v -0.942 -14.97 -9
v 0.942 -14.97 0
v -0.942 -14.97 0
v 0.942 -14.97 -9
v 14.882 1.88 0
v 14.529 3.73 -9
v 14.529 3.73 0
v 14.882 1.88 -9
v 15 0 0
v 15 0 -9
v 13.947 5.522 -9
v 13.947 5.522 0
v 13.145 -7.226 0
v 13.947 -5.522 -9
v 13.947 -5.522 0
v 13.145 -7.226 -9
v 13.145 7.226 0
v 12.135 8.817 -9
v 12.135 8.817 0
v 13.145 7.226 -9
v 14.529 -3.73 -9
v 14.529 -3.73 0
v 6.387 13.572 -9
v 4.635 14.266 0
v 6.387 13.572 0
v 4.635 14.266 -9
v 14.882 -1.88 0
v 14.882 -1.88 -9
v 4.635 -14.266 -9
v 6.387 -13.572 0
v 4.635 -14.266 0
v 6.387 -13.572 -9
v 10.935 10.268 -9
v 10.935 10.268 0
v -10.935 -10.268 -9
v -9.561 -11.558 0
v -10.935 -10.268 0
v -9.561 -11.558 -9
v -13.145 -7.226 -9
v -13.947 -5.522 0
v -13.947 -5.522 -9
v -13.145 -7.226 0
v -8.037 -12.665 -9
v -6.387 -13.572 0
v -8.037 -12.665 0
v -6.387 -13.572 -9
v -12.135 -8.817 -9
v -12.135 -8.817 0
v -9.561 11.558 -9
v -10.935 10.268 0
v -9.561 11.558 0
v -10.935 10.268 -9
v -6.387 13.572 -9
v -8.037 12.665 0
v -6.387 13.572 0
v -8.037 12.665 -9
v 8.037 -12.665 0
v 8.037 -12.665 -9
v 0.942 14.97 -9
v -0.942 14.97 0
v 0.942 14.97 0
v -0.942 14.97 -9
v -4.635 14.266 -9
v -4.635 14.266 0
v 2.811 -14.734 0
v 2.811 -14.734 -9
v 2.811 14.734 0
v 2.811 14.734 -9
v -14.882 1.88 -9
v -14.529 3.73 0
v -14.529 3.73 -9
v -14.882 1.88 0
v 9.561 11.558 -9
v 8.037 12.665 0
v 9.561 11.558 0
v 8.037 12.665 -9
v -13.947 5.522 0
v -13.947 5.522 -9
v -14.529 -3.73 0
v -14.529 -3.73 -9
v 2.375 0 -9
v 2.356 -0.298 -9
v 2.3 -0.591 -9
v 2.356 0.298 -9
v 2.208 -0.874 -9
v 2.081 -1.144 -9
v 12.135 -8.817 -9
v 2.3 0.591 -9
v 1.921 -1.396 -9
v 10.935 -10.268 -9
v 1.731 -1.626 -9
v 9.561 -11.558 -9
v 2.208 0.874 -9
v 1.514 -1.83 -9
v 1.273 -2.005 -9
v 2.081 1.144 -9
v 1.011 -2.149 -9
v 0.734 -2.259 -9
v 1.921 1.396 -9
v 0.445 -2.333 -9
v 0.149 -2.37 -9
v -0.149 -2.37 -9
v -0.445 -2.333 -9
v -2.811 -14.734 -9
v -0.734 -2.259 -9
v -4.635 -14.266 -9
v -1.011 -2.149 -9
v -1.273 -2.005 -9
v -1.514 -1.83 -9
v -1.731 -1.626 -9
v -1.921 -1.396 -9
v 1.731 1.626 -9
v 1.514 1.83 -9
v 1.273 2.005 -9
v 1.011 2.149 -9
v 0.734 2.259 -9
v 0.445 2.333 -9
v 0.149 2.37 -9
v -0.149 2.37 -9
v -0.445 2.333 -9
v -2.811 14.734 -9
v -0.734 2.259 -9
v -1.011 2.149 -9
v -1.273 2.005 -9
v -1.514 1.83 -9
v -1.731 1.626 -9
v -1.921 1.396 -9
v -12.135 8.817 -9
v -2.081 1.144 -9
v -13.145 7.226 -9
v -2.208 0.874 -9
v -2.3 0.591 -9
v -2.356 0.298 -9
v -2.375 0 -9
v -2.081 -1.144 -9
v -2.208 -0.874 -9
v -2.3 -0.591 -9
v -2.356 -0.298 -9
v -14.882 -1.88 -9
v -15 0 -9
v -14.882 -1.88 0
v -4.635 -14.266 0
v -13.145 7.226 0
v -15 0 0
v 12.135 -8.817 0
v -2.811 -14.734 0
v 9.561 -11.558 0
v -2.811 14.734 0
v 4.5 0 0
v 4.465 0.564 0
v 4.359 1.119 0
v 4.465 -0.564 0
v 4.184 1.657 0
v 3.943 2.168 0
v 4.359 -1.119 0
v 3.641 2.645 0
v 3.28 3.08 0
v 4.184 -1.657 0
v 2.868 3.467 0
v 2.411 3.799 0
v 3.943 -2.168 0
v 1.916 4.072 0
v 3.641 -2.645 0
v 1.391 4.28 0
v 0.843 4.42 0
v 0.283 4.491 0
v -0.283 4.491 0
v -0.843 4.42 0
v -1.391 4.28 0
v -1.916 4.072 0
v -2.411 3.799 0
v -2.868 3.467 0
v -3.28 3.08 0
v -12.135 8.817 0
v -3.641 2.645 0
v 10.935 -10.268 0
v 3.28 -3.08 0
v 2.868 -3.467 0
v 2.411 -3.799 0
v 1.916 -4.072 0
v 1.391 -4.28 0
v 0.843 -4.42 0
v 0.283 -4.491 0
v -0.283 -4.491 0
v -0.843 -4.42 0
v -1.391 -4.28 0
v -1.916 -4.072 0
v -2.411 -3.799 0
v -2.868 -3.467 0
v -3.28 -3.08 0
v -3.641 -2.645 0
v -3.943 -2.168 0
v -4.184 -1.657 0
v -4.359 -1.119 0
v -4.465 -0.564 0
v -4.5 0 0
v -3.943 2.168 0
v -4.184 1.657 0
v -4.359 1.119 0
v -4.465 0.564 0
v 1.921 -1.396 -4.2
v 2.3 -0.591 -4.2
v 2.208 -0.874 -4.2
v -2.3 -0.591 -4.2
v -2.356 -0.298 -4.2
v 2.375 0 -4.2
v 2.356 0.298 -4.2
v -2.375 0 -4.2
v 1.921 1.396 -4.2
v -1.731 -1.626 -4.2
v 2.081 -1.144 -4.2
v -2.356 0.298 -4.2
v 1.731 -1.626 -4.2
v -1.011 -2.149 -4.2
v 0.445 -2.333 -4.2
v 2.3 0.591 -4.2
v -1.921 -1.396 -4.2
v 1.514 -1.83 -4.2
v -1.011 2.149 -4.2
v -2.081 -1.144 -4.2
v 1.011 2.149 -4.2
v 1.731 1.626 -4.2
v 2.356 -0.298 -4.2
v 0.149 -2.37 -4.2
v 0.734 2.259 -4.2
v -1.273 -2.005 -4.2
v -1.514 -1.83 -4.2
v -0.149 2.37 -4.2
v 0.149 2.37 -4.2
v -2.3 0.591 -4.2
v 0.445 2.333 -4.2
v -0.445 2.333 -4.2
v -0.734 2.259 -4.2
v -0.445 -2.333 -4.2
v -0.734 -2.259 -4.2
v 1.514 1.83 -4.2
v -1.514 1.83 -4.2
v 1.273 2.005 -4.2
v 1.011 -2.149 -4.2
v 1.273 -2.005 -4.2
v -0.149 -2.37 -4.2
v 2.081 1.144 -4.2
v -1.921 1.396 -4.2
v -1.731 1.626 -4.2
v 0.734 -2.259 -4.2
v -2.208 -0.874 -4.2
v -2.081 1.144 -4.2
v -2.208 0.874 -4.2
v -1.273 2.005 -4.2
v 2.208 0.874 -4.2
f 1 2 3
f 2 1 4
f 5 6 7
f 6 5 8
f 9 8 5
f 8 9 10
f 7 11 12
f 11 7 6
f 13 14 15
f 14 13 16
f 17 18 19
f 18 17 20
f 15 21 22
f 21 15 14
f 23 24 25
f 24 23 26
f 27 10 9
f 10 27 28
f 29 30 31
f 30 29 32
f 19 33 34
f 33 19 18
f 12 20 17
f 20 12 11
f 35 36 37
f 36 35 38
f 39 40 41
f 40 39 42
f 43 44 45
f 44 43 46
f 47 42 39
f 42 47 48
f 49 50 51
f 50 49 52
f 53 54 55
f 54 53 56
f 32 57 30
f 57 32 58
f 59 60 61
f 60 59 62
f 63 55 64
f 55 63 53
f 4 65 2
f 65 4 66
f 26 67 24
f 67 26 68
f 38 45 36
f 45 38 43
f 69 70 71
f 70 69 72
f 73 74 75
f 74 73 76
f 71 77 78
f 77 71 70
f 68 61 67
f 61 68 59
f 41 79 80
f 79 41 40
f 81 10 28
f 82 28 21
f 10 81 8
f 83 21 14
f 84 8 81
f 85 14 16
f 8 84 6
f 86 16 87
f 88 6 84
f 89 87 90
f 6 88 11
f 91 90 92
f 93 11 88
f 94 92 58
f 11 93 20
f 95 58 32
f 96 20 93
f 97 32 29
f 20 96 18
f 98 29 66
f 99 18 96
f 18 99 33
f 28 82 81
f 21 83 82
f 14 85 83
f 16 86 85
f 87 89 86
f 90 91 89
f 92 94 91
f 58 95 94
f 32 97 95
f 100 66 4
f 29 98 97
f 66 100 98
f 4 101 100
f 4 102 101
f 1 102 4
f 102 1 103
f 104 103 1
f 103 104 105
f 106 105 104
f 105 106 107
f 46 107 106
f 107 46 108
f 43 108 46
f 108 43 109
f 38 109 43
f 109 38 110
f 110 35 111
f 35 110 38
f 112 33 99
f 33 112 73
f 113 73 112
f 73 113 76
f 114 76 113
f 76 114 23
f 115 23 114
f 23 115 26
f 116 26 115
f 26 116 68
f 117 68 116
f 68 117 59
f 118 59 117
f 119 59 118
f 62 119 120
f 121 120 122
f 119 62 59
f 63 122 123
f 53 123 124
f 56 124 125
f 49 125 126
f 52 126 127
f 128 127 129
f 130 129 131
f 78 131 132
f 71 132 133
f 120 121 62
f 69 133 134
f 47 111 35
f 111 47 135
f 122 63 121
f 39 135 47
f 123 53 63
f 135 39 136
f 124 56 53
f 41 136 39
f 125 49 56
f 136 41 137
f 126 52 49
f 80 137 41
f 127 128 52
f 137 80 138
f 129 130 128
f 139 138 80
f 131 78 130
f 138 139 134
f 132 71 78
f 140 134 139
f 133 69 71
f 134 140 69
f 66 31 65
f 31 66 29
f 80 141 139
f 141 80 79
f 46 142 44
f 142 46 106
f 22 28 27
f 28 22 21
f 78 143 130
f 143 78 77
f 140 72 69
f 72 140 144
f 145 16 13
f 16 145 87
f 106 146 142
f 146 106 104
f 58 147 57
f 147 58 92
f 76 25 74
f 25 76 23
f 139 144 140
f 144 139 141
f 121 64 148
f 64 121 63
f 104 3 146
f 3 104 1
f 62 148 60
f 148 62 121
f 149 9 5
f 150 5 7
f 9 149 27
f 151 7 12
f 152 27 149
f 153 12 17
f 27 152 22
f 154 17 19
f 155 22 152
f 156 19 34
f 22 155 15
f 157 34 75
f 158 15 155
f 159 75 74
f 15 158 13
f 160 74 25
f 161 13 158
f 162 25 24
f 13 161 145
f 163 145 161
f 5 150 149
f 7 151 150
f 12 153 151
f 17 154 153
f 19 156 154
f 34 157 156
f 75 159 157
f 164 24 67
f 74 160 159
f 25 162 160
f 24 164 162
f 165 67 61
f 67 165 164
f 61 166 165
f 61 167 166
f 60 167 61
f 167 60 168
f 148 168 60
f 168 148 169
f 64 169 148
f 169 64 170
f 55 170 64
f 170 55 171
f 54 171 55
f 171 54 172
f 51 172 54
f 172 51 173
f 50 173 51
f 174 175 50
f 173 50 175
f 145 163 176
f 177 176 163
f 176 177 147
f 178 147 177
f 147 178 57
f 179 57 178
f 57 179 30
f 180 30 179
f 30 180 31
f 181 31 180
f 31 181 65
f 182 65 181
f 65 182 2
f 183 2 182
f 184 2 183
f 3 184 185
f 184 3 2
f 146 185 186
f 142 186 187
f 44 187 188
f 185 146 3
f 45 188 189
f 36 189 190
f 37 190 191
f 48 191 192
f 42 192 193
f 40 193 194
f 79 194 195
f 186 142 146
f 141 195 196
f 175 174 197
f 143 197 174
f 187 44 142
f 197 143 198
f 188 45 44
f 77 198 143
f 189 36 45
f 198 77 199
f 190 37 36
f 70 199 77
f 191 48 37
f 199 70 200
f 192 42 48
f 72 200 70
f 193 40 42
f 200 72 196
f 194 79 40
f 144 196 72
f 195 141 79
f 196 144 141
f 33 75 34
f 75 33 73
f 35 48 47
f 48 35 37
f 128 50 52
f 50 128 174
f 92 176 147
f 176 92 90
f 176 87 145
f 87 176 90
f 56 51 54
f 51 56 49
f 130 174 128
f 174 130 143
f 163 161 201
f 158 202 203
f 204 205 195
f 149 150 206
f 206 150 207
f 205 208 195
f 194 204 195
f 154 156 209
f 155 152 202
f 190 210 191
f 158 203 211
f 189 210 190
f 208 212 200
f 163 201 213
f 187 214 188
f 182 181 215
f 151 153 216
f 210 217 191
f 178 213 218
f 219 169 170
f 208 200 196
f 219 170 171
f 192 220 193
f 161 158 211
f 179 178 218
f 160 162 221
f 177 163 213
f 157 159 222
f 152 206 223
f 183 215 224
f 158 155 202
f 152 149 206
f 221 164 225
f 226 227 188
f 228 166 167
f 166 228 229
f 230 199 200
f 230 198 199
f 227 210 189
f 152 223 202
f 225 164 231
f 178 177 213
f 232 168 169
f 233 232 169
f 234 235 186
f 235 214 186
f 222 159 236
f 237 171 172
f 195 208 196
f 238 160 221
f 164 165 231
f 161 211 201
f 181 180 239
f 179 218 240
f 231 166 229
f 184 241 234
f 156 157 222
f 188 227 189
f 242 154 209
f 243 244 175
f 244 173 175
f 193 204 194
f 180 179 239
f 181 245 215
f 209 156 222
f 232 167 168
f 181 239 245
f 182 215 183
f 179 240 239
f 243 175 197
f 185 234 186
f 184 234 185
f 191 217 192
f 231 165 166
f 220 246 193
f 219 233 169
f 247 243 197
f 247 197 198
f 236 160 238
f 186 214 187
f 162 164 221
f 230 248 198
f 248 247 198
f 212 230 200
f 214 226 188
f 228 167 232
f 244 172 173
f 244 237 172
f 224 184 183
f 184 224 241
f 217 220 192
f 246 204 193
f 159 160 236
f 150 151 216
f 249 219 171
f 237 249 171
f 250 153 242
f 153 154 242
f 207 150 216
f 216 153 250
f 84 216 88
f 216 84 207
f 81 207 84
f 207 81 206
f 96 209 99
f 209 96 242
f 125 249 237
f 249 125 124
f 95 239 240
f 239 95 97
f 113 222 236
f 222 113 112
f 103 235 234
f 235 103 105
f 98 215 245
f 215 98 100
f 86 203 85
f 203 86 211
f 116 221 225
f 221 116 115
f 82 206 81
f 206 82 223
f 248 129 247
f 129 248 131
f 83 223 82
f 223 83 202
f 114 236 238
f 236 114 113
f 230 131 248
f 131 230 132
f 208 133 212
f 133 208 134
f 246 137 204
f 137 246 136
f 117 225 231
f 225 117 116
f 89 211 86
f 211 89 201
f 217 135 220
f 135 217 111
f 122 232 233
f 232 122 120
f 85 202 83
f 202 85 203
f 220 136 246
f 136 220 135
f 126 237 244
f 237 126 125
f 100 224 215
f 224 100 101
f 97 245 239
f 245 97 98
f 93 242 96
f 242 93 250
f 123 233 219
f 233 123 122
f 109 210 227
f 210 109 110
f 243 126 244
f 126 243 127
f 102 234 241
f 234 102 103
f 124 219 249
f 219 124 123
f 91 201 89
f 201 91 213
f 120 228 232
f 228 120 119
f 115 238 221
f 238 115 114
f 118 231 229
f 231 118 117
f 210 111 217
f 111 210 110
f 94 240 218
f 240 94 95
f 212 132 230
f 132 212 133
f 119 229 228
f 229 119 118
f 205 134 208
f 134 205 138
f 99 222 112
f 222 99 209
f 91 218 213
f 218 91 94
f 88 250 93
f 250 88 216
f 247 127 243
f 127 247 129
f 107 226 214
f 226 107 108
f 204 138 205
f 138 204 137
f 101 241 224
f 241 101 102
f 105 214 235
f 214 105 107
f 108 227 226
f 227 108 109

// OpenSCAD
$fn = 50;


difference() {
	union() {
		translate(v = [0, 0, -9.0000000000]) {
			cylinder(h = 9, r = 15.0000000000);
		}
		translate(v = [0, 0, -9.0000000000]) {
			cylinder(h = 9, r = 2.8750000000);
		}
	}
	union() {
		translate(v = [0, 0, 0]) {
			rotate(a = [0, 0, 0]) {
				difference() {
					union() {
						#translate(v = [0, 0, -9.0000000000]) {
							cylinder(h = 9, r = 2.2500000000);
						}
						#translate(v = [0, 0, -4.2000000000]) {
							cylinder(h = 4.2000000000, r1 = 2.3750000000, r2 = 4.5000000000);
						}
						#translate(v = [0, 0, -9.0000000000]) {
							cylinder(h = 9, r = 2.3750000000);
						}
						#translate(v = [0, 0, -9.0000000000]) {
							cylinder(h = 9, r = 2.2500000000);
						}
					}
					union();
				}
			}
		}
	}
}
